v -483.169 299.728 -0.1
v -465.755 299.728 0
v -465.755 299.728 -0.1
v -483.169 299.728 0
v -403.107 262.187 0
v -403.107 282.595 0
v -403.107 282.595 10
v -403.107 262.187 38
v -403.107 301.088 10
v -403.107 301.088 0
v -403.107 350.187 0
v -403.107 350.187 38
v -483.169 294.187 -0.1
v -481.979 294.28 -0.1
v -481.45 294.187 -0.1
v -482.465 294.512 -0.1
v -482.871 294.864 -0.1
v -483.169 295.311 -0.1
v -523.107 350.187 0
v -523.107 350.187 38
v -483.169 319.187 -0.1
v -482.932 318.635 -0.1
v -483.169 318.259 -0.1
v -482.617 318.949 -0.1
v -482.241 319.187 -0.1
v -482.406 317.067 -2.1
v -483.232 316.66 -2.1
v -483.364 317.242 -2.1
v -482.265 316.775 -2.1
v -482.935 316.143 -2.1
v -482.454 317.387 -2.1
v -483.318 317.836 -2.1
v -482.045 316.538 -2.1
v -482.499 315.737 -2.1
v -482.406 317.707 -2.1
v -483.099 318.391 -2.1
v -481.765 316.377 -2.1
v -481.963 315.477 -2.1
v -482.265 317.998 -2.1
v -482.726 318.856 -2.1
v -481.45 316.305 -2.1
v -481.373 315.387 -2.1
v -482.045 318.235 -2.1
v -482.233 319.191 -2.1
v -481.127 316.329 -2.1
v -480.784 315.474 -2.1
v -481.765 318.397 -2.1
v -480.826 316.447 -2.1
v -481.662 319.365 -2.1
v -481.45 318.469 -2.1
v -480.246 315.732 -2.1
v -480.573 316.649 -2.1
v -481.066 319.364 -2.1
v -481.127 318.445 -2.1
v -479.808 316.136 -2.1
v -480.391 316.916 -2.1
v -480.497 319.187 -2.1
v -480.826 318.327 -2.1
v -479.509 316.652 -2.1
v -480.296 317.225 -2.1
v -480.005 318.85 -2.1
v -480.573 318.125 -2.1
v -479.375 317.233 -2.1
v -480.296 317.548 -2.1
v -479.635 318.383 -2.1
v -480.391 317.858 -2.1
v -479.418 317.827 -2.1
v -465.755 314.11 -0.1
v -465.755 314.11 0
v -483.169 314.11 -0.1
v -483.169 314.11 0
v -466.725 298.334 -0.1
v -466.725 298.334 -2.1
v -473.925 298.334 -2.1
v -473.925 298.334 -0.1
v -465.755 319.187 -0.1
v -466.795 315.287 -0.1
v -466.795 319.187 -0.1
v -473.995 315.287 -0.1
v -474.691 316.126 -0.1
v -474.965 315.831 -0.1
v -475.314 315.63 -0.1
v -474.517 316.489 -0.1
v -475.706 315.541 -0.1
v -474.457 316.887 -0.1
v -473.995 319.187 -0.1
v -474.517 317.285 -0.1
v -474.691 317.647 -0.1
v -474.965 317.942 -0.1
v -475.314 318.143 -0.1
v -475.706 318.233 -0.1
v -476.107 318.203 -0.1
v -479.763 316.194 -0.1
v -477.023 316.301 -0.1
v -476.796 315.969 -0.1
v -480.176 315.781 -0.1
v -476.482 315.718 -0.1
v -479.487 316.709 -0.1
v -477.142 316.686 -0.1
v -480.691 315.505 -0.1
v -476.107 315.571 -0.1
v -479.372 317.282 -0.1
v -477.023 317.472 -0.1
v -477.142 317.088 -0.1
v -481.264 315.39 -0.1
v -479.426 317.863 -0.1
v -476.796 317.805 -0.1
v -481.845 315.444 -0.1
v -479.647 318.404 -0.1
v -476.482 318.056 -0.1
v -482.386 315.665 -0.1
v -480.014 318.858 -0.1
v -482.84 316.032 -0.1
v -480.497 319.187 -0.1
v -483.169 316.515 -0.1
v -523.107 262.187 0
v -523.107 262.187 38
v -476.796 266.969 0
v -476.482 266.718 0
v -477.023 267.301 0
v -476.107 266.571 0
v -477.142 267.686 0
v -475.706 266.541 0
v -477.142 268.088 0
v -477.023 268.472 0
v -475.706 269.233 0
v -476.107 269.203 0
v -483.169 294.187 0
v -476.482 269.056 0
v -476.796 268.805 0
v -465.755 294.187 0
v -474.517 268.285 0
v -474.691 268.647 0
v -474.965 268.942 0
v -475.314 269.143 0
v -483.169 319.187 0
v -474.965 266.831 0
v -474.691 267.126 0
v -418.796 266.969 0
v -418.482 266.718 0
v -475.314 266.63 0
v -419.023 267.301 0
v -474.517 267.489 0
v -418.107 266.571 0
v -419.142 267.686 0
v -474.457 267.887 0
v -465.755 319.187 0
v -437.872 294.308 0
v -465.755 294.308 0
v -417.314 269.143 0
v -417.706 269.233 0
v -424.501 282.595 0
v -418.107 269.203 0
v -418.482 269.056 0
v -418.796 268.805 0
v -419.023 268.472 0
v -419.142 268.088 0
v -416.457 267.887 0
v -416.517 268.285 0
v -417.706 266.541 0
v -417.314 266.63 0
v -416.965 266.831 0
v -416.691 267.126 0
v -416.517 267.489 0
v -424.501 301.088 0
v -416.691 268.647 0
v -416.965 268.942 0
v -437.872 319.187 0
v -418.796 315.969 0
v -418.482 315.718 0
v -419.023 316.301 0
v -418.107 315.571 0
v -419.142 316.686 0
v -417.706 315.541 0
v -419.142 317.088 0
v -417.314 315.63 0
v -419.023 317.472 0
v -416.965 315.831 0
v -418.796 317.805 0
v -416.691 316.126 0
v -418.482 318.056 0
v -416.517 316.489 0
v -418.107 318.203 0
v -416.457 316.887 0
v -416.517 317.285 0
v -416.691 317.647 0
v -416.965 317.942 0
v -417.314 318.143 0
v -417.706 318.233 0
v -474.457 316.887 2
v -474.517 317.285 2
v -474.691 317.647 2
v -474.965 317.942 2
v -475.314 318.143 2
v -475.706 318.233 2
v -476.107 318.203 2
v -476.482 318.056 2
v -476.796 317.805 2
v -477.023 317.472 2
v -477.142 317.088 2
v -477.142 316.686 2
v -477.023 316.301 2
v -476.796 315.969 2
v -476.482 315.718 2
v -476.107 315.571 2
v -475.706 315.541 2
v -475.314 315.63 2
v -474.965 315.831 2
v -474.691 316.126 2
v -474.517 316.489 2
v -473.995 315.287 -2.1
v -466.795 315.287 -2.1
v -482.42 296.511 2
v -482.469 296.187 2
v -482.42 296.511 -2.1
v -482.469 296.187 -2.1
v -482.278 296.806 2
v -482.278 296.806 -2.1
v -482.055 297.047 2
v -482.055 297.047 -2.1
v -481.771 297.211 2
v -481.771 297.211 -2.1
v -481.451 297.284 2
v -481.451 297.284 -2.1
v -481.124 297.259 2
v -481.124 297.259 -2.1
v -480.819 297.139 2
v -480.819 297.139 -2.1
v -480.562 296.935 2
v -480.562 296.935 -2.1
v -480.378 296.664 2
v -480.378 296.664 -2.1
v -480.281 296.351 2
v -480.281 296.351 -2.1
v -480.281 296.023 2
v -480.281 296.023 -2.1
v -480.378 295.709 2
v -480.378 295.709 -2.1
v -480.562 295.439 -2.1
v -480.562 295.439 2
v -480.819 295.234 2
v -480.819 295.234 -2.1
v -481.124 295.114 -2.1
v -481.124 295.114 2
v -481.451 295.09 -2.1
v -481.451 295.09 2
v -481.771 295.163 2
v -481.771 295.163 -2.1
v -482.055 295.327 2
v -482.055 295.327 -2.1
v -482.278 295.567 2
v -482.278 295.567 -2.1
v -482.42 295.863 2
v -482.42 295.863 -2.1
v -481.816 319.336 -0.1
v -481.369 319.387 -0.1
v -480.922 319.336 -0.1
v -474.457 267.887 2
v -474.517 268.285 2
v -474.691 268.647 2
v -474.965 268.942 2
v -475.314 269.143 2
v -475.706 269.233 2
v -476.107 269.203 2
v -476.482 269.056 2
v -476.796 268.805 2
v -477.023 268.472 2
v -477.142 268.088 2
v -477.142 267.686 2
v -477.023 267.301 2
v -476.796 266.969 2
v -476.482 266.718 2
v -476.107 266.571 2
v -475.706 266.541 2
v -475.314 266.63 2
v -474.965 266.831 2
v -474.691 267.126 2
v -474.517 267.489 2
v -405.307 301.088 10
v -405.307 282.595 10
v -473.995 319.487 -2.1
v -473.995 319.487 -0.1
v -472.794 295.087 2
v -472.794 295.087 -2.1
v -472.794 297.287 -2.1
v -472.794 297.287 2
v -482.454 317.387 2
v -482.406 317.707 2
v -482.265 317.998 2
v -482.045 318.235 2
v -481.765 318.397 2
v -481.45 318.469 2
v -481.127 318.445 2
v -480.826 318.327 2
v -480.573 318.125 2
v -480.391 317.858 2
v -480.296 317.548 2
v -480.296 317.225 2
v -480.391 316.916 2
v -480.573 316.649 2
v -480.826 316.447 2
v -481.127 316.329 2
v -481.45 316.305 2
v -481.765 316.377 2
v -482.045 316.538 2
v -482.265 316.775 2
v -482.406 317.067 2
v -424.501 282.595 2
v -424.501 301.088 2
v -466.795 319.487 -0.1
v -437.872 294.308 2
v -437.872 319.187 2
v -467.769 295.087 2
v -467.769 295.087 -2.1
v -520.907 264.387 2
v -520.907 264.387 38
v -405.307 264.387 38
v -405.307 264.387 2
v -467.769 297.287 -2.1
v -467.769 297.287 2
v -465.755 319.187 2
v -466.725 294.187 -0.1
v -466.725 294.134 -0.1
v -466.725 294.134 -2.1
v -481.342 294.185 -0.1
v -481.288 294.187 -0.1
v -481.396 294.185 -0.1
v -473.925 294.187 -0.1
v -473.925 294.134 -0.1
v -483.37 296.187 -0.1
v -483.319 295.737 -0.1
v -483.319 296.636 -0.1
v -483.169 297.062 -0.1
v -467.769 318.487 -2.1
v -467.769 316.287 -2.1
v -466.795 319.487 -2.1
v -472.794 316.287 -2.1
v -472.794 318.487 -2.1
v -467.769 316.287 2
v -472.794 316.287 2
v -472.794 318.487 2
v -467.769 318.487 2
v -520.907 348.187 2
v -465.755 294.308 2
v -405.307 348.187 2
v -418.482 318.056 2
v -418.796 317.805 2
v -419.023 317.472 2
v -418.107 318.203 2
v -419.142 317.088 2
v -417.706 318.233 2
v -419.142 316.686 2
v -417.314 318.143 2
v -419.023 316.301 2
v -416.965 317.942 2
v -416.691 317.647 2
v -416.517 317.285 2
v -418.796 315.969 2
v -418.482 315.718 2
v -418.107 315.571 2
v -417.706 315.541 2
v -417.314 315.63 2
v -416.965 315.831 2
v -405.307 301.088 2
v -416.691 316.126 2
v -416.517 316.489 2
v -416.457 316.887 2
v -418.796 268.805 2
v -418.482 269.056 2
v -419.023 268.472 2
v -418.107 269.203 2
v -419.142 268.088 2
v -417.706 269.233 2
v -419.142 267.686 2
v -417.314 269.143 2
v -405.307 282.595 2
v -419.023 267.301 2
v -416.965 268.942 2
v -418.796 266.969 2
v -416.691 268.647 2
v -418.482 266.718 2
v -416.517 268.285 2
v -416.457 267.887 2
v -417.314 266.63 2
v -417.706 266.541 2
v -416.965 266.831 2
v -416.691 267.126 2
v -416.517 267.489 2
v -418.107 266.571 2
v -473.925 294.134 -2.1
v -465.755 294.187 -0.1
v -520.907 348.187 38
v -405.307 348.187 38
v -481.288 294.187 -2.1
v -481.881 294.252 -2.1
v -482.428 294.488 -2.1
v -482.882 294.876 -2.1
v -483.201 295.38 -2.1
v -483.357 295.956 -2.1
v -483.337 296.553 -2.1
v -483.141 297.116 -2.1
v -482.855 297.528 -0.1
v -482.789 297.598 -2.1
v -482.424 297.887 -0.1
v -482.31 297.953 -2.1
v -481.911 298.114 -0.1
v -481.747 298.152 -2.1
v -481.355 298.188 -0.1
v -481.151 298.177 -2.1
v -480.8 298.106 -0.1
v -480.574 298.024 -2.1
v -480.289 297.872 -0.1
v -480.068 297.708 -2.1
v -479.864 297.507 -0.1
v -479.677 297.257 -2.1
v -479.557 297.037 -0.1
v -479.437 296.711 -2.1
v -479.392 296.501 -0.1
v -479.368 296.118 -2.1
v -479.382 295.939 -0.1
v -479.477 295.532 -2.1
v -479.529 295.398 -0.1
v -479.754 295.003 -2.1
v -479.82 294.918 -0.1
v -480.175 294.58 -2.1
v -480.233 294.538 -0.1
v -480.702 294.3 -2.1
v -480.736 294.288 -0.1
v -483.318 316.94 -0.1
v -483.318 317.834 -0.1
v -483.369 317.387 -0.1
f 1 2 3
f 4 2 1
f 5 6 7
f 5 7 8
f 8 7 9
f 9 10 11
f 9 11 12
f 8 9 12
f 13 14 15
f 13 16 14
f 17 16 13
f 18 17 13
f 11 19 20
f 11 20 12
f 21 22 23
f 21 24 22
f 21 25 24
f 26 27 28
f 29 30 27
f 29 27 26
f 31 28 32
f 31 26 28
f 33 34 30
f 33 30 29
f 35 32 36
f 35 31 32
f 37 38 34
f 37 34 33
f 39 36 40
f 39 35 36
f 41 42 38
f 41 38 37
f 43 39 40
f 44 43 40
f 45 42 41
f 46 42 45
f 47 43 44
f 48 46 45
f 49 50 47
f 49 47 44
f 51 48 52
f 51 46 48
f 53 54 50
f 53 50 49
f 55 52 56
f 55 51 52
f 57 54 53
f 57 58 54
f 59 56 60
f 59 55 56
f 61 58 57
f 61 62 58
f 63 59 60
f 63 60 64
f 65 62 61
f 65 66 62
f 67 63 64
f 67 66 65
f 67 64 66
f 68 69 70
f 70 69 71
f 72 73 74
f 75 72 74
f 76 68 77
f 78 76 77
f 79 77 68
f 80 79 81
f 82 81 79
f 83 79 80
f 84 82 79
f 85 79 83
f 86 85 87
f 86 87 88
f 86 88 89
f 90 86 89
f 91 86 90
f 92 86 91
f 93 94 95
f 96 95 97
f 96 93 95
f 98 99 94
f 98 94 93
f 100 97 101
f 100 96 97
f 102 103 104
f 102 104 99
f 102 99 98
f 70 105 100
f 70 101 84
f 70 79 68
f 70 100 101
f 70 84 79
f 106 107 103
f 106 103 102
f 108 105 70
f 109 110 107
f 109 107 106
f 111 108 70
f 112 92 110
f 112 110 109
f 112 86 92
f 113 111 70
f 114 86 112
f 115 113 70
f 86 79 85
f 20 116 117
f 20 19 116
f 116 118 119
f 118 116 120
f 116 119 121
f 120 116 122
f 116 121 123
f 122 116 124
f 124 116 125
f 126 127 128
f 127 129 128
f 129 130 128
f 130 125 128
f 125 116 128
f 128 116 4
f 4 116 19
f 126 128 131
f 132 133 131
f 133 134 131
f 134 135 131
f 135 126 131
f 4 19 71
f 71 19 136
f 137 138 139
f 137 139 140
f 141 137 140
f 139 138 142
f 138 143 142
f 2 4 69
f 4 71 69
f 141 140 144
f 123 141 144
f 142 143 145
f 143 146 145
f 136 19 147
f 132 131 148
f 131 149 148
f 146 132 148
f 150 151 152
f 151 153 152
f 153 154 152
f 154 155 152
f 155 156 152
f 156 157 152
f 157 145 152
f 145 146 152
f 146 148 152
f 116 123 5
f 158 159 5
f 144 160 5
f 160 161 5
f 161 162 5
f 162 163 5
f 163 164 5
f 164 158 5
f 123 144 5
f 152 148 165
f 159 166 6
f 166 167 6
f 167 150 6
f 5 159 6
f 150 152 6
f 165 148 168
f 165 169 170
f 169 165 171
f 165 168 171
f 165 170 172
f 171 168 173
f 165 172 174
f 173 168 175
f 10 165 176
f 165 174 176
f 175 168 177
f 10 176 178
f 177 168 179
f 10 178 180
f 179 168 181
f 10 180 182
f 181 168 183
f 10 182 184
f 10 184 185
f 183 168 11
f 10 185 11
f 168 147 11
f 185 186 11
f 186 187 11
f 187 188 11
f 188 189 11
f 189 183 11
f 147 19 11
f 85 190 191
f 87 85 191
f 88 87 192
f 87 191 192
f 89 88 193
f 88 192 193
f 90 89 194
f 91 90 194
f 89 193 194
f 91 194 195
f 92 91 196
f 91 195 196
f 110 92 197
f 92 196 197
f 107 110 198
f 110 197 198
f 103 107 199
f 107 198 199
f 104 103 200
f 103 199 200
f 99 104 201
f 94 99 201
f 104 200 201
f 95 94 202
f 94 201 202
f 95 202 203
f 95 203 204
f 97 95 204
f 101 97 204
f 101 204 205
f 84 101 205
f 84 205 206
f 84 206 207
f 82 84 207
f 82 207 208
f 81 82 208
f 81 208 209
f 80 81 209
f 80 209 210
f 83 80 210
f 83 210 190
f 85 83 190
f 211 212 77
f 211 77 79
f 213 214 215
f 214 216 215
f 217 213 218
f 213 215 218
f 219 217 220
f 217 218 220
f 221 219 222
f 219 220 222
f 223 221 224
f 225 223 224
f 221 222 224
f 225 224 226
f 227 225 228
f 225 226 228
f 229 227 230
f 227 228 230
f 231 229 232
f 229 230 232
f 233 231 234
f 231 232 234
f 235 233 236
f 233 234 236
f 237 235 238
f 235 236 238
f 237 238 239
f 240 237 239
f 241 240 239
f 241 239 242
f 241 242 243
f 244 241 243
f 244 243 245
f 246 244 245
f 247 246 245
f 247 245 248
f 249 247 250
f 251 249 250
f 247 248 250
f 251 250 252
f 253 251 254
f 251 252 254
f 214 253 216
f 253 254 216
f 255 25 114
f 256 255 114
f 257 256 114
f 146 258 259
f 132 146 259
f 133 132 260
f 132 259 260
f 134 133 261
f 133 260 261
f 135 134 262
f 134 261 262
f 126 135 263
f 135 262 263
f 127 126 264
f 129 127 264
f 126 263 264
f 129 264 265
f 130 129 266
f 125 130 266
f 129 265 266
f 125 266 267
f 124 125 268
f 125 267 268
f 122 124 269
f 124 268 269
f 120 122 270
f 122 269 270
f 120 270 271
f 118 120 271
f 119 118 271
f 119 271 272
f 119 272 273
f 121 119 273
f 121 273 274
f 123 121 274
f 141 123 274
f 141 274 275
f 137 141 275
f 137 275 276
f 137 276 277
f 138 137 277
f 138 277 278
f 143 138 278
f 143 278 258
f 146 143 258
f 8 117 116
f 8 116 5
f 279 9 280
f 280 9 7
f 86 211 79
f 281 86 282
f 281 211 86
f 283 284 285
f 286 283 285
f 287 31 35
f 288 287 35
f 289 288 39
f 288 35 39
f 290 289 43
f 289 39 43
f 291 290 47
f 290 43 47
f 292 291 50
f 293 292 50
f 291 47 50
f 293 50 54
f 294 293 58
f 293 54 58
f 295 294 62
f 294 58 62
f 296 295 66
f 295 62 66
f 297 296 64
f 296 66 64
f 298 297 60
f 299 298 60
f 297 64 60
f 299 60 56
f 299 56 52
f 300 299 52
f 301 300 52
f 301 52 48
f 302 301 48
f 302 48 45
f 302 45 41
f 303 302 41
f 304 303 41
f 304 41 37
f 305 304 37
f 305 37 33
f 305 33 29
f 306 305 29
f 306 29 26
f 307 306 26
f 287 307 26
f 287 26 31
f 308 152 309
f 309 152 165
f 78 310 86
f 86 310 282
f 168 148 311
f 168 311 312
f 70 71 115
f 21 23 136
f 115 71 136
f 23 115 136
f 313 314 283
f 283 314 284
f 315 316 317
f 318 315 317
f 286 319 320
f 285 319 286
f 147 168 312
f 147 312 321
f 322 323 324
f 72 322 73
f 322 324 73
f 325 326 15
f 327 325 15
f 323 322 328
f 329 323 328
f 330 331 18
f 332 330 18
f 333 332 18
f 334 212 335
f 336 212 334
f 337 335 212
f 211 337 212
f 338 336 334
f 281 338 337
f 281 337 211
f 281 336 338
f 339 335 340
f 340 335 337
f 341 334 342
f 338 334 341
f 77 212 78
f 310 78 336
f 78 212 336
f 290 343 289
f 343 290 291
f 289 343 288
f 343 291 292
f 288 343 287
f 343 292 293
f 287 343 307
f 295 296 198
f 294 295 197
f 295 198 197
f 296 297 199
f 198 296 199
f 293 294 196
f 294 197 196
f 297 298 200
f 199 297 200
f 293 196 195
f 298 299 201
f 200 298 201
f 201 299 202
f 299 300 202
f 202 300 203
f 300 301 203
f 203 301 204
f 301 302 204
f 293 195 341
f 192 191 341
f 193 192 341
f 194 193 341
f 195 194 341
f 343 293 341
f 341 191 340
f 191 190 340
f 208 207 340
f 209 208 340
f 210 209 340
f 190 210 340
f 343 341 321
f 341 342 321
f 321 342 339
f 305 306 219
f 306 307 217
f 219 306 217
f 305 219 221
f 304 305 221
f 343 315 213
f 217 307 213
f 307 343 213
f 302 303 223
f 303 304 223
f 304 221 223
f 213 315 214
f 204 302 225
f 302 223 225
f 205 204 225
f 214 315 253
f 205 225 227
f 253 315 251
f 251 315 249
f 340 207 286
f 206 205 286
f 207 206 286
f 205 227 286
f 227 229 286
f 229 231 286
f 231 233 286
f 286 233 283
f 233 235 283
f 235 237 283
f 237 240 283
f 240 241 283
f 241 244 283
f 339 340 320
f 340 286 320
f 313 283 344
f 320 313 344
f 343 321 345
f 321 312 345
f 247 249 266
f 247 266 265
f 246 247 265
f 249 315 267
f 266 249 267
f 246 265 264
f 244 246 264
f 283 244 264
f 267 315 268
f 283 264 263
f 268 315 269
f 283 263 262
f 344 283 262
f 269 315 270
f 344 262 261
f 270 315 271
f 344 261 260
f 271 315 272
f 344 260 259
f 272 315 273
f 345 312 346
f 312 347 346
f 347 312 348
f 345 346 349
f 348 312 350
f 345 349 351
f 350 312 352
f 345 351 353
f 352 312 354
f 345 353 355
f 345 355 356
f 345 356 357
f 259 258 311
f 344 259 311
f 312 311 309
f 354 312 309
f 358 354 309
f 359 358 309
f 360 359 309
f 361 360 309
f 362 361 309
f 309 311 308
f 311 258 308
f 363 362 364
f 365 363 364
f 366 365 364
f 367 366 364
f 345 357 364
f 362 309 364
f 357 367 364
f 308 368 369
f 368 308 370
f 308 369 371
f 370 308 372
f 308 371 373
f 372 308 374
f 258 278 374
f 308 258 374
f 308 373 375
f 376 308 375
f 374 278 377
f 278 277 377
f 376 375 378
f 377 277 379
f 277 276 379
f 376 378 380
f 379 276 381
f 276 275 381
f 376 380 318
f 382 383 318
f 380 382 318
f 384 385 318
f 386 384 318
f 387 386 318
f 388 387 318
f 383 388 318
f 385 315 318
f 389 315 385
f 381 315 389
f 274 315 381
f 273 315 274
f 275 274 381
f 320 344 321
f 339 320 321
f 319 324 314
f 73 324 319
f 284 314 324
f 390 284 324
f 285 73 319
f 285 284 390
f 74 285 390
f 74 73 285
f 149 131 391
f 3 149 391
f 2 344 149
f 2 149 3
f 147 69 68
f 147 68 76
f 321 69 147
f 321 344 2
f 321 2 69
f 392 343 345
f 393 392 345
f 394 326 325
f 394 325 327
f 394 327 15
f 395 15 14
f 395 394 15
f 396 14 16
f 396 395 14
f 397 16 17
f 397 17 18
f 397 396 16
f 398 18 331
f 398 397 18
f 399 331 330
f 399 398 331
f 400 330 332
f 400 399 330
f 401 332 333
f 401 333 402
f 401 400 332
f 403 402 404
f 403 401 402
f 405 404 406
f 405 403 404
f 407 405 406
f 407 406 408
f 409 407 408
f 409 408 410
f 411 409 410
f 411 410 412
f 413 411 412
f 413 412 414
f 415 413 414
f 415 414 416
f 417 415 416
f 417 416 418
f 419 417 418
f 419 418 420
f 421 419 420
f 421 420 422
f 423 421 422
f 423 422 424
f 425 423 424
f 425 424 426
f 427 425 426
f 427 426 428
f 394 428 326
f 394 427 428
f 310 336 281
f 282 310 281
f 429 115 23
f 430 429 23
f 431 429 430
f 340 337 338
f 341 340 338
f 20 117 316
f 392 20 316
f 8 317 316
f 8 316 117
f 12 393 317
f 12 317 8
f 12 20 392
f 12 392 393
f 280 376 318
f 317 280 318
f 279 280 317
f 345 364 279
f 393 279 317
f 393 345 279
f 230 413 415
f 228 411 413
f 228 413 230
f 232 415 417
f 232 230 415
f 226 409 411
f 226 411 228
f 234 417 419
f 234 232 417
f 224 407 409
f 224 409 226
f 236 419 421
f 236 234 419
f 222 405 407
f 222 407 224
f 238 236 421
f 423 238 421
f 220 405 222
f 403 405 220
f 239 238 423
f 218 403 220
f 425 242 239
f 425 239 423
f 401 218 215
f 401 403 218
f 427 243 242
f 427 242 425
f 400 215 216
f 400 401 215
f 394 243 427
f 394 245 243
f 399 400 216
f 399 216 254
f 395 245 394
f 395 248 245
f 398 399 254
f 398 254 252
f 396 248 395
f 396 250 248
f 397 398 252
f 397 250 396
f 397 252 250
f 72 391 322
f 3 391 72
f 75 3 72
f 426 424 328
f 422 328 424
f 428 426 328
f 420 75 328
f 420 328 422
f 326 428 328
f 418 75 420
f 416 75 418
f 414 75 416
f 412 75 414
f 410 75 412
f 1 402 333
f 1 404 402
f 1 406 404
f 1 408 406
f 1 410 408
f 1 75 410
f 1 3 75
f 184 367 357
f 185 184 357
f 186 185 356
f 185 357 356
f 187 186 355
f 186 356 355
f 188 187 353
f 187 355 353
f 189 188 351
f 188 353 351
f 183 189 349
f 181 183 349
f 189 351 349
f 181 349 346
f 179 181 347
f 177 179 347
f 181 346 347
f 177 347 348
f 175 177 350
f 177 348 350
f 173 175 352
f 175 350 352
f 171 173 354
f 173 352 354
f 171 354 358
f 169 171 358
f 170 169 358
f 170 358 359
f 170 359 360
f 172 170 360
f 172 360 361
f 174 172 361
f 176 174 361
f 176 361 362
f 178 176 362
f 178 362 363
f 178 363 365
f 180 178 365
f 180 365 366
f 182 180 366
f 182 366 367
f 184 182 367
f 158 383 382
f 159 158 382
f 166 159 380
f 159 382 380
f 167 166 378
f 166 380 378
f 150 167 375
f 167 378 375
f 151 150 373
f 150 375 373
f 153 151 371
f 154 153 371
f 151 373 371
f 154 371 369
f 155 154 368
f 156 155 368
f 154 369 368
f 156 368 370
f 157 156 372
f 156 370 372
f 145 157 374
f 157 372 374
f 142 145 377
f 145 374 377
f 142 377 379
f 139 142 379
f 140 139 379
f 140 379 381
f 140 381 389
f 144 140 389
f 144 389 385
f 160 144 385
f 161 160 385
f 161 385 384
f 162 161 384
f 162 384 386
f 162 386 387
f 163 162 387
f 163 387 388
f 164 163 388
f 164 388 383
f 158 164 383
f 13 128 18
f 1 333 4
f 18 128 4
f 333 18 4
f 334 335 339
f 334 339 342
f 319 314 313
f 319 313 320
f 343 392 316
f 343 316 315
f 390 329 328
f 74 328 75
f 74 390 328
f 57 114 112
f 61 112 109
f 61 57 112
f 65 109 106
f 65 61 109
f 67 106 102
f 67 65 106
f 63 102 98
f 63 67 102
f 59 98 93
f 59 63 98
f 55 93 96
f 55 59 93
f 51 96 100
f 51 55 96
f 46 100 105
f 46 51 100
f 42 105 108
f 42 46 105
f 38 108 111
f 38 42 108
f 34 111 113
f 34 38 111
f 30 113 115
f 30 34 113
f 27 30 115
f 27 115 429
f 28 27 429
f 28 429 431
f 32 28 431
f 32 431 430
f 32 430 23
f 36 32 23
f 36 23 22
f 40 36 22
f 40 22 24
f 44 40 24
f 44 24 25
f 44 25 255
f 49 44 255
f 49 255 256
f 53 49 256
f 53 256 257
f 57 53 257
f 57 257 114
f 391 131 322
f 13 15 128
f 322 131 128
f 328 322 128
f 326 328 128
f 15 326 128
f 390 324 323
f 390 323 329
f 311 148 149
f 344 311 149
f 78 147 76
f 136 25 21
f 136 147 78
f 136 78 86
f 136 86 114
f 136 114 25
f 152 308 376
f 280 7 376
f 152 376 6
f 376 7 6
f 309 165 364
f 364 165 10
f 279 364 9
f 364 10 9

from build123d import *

# Parameters (mm, degrees)
SKETCH_1_W          = 120
SKETCH_1_H          = 80
EXTRUDE_1_DEPTH     = 38
SKETCH_3_W          = 117.6
SKETCH_3_H          = 77.6
CUT_EXTRUDE_1_DEPTH = 36
SKETCH_4_W          = 25.152970524
SKETCH_4_H          = 18.492901276
CUT_EXTRUDE_2_DEPTH = 10
SKETCH_7_W          = 17.413678367
SKETCH_7_H          = 5.076618726
SKETCH_7_H_2        = 5.541721388
EXTRUDE_2_DEPTH     = 0.1
SKETCH_9_W          = 27.882777132
SKETCH_9_H          = 24.878568111
CUT_EXTRUDE_4_DEPTH = 12
SKETCH_12_R         = 1.085209003
SKETCH_12_R_2       = 1.1
SKETCH_12_W         = 5.025
SKETCH_12_H         = 2.2
CUT_EXTRUDE_5_DEPTH = 12
SKETCH_13_R         = 1.35
CUT_EXTRUDE_6_DEPTH = 12
SKETCH_14_W         = 117.6
SKETCH_14_H         = 36
CUT_EXTRUDE_7_DEPTH = 10
EXTRUDE_3_DEPTH     = 5
SKETCH_16_W         = 120
SKETCH_16_H         = 38
EXTRUDE_4_DEPTH     = 2
SKETCH_17_W         = 36
SKETCH_17_H         = 83.8
EXTRUDE_5_DEPTH     = 1
EXTRUDE_6_DEPTH     = 1
SKETCH_19_W         = 120
SKETCH_19_H         = 38
EXTRUDE_7_DEPTH     = 1
EXTRUDE_START       = 2
SKETCH_20_R         = 2
SKETCH_20_R_2       = 1.085209003
SKETCH_20_R_3       = 2.001649737
SKETCH_20_R_4       = 1.1
SKETCH_20_W         = 7.2
SKETCH_20_H         = 4.2
SKETCH_20_W_2       = 5.025
SKETCH_20_H_2       = 2.2
EXTRUDE_8_DEPTH     = 2


with BuildPart() as part:
    # 草图1 → 凸台-拉伸1 (new body)
    with BuildSketch(Plane.XY):
        with Locations((-463.106796117, 303.186737633)):
            Rectangle(SKETCH_1_W, SKETCH_1_H)
    extrude(amount=EXTRUDE_1_DEPTH)

    # 草图3 → 切除-拉伸1 (cut)
    with BuildSketch(Plane.XY.offset(38)):
        with Locations((-463.106796117, 303.186737633)):
            Rectangle(SKETCH_3_W, SKETCH_3_H)
    extrude(amount=-CUT_EXTRUDE_1_DEPTH, mode=Mode.SUBTRACT)

    # 草图4 → 切除-拉伸2 (cut)
    with BuildSketch(Plane(origin=(0, 0, 0), x_dir=(-1, 0, 0), z_dir=(0, 0, -1))):
        with Locations((411.924701676, 291.841861287)):
            Rectangle(SKETCH_4_W, SKETCH_4_H)
    extrude(amount=-CUT_EXTRUDE_2_DEPTH, mode=Mode.SUBTRACT)

    # 草图7 → 凸台-拉伸2 (add)
    with BuildSketch(Plane(origin=(0, 0, 0), x_dir=(-1, 0, 0), z_dir=(0, 0, -1))):
        with Locations((474.461956934, 316.64842827)):
            Rectangle(SKETCH_7_W, SKETCH_7_H)
        with Locations((474.461956934, 296.957598327)):
            Rectangle(SKETCH_7_W, SKETCH_7_H_2)
    extrude(amount=EXTRUDE_2_DEPTH)

    # 草图9 → 切除-拉伸4 (cut)
    with BuildSketch(Plane(origin=(0, 0, 0), x_dir=(-1, 0, 0), z_dir=(0, 0, -1))):
        with Locations((451.813729184, 306.747453577)):
            Rectangle(SKETCH_9_W, SKETCH_9_H)
    extrude(amount=-CUT_EXTRUDE_4_DEPTH, mode=Mode.SUBTRACT)

    # 草图12 → 切除-拉伸5 (cut)
    with BuildSketch(Plane(origin=(0, 0, -0.1), x_dir=(-1, 0, 0), z_dir=(0, 0, -1))):
        with Locations((481.368796117, 317.386737633)):
            Circle(SKETCH_12_R)
        with Locations((481.368796117, 296.186737633)):
            Circle(SKETCH_12_R_2)
        with Locations((470.281296117, 317.386737633)):
            Rectangle(SKETCH_12_W, SKETCH_12_H)
        with Locations((470.281296117, 296.186737633)):
            Rectangle(SKETCH_12_W, SKETCH_12_H)
    extrude(amount=-CUT_EXTRUDE_5_DEPTH, mode=Mode.SUBTRACT)

    # 草图13 → 切除-拉伸6 (cut)
    with BuildSketch(Plane.XY.offset(2)):
        with Locations((-475.806796117, 316.886737633)):
            Circle(SKETCH_13_R)
        with Locations((-417.806796117, 316.886737633)):
            Circle(SKETCH_13_R)
        with Locations((-417.806796117, 267.886737633)):
            Circle(SKETCH_13_R)
        with Locations((-475.806796117, 267.886737633)):
            Circle(SKETCH_13_R)
    extrude(amount=-CUT_EXTRUDE_6_DEPTH, mode=Mode.SUBTRACT)

    # 草图14 → 切除-拉伸7 (cut)
    with BuildSketch(Plane.XZ.offset(-341.986737633)):
        with Locations((-463.106796117, 20)):
            Rectangle(SKETCH_14_W, SKETCH_14_H)
    extrude(amount=-CUT_EXTRUDE_7_DEPTH, mode=Mode.SUBTRACT)

    # 草图15 → 凸台-拉伸3 (add)
    with BuildSketch(Plane(origin=(0, 343.186737633, 0), x_dir=(1, 0, 0), z_dir=(0, 1, 0))):
        Polygon((-521.906796117, -2), (-404.306796117, -2), (-404.306796117, -38), (-403.106796117, -38), (-403.106796117, 0), (-523.106796117, 0), (-523.106796117, -38), (-521.906796117, -38), align=None)
    extrude(amount=EXTRUDE_3_DEPTH)

    # 草图16 → 凸台-拉伸4 (add)
    with BuildSketch(Plane(origin=(0, 348.186737633, 0), x_dir=(1, 0, 0), z_dir=(0, 1, 0))):
        with Locations((-463.106796117, -19)):
            Rectangle(SKETCH_16_W, SKETCH_16_H)
    extrude(amount=EXTRUDE_4_DEPTH)

    # 草图17 → 凸台-拉伸5 (add)
    with BuildSketch(Plane(origin=(-521.906796117, 0, 0), x_dir=(0, 0, -1), z_dir=(1, 0, 0))):
        with Locations((-20, 306.286737633)):
            Rectangle(SKETCH_17_W, SKETCH_17_H)
    extrude(amount=EXTRUDE_5_DEPTH)

    # 草图18 → 凸台-拉伸6 (add)
    with BuildSketch(Plane.ZY.offset(404.306796117)):
        Polygon((10, 301.088311925), (10, 282.595410649), (2, 282.595410649), (2, 264.386737633), (38, 264.386737633), (38, 348.186737633), (2, 348.186737633), (2, 301.088311925), align=None)
    extrude(amount=EXTRUDE_6_DEPTH)

    # 草图19 → 凸台-拉伸7 (add)
    with BuildSketch(Plane.XZ.offset(-263.186737633)):
        with Locations((-463.106796117, 19)):
            Rectangle(SKETCH_19_W, SKETCH_19_H)
    extrude(amount=EXTRUDE_7_DEPTH)

    # 草图20 → 凸台-拉伸8 (add)
    # profile 1 of 4: a face of its own
    with BuildSketch(Plane(origin=(0, 0, -0.1), x_dir=(-1, 0, 0), z_dir=(0, 0, -1)).offset(EXTRUDE_START)):
        with Locations(Location((481.368796117, 317.386737633, 0), (0, 0, 115.841932763))):
            Circle(SKETCH_20_R)
        with Locations((481.368796117, 317.386737633)):
            Circle(SKETCH_20_R_2, mode=Mode.SUBTRACT)
    # profile 2 of 4: a face of its own
    with BuildSketch(Plane(origin=(0, 0, -0.1), x_dir=(-1, 0, 0), z_dir=(0, 0, -1)).offset(EXTRUDE_START)):
        with Locations(Location((481.368796117, 296.186737633, 0), (0, 0, 267.673619076))):
            Circle(SKETCH_20_R_3)
        with Locations((481.368796117, 296.186737633)):
            Circle(SKETCH_20_R_4, mode=Mode.SUBTRACT)
    # profile 3 of 4: a face of its own
    with BuildSketch(Plane(origin=(0, 0, -0.1), x_dir=(-1, 0, 0), z_dir=(0, 0, -1)).offset(EXTRUDE_START)):
        with Locations((470.395177276, 317.386737633)):
            Rectangle(SKETCH_20_W, SKETCH_20_H)
        with Locations((470.281296117, 317.386737633)):
            Rectangle(SKETCH_20_W_2, SKETCH_20_H_2, mode=Mode.SUBTRACT)
    # profile 4 of 4: a face of its own
    with BuildSketch(Plane(origin=(0, 0, -0.1), x_dir=(-1, 0, 0), z_dir=(0, 0, -1)).offset(EXTRUDE_START)):
        with Locations((470.325427447, 296.233937818)):
            Rectangle(SKETCH_20_W, SKETCH_20_H)
        with Locations((470.281296117, 296.186737633)):
            Rectangle(SKETCH_20_W_2, SKETCH_20_H_2, mode=Mode.SUBTRACT)
    extrude(amount=-EXTRUDE_8_DEPTH)


solid = part.part
